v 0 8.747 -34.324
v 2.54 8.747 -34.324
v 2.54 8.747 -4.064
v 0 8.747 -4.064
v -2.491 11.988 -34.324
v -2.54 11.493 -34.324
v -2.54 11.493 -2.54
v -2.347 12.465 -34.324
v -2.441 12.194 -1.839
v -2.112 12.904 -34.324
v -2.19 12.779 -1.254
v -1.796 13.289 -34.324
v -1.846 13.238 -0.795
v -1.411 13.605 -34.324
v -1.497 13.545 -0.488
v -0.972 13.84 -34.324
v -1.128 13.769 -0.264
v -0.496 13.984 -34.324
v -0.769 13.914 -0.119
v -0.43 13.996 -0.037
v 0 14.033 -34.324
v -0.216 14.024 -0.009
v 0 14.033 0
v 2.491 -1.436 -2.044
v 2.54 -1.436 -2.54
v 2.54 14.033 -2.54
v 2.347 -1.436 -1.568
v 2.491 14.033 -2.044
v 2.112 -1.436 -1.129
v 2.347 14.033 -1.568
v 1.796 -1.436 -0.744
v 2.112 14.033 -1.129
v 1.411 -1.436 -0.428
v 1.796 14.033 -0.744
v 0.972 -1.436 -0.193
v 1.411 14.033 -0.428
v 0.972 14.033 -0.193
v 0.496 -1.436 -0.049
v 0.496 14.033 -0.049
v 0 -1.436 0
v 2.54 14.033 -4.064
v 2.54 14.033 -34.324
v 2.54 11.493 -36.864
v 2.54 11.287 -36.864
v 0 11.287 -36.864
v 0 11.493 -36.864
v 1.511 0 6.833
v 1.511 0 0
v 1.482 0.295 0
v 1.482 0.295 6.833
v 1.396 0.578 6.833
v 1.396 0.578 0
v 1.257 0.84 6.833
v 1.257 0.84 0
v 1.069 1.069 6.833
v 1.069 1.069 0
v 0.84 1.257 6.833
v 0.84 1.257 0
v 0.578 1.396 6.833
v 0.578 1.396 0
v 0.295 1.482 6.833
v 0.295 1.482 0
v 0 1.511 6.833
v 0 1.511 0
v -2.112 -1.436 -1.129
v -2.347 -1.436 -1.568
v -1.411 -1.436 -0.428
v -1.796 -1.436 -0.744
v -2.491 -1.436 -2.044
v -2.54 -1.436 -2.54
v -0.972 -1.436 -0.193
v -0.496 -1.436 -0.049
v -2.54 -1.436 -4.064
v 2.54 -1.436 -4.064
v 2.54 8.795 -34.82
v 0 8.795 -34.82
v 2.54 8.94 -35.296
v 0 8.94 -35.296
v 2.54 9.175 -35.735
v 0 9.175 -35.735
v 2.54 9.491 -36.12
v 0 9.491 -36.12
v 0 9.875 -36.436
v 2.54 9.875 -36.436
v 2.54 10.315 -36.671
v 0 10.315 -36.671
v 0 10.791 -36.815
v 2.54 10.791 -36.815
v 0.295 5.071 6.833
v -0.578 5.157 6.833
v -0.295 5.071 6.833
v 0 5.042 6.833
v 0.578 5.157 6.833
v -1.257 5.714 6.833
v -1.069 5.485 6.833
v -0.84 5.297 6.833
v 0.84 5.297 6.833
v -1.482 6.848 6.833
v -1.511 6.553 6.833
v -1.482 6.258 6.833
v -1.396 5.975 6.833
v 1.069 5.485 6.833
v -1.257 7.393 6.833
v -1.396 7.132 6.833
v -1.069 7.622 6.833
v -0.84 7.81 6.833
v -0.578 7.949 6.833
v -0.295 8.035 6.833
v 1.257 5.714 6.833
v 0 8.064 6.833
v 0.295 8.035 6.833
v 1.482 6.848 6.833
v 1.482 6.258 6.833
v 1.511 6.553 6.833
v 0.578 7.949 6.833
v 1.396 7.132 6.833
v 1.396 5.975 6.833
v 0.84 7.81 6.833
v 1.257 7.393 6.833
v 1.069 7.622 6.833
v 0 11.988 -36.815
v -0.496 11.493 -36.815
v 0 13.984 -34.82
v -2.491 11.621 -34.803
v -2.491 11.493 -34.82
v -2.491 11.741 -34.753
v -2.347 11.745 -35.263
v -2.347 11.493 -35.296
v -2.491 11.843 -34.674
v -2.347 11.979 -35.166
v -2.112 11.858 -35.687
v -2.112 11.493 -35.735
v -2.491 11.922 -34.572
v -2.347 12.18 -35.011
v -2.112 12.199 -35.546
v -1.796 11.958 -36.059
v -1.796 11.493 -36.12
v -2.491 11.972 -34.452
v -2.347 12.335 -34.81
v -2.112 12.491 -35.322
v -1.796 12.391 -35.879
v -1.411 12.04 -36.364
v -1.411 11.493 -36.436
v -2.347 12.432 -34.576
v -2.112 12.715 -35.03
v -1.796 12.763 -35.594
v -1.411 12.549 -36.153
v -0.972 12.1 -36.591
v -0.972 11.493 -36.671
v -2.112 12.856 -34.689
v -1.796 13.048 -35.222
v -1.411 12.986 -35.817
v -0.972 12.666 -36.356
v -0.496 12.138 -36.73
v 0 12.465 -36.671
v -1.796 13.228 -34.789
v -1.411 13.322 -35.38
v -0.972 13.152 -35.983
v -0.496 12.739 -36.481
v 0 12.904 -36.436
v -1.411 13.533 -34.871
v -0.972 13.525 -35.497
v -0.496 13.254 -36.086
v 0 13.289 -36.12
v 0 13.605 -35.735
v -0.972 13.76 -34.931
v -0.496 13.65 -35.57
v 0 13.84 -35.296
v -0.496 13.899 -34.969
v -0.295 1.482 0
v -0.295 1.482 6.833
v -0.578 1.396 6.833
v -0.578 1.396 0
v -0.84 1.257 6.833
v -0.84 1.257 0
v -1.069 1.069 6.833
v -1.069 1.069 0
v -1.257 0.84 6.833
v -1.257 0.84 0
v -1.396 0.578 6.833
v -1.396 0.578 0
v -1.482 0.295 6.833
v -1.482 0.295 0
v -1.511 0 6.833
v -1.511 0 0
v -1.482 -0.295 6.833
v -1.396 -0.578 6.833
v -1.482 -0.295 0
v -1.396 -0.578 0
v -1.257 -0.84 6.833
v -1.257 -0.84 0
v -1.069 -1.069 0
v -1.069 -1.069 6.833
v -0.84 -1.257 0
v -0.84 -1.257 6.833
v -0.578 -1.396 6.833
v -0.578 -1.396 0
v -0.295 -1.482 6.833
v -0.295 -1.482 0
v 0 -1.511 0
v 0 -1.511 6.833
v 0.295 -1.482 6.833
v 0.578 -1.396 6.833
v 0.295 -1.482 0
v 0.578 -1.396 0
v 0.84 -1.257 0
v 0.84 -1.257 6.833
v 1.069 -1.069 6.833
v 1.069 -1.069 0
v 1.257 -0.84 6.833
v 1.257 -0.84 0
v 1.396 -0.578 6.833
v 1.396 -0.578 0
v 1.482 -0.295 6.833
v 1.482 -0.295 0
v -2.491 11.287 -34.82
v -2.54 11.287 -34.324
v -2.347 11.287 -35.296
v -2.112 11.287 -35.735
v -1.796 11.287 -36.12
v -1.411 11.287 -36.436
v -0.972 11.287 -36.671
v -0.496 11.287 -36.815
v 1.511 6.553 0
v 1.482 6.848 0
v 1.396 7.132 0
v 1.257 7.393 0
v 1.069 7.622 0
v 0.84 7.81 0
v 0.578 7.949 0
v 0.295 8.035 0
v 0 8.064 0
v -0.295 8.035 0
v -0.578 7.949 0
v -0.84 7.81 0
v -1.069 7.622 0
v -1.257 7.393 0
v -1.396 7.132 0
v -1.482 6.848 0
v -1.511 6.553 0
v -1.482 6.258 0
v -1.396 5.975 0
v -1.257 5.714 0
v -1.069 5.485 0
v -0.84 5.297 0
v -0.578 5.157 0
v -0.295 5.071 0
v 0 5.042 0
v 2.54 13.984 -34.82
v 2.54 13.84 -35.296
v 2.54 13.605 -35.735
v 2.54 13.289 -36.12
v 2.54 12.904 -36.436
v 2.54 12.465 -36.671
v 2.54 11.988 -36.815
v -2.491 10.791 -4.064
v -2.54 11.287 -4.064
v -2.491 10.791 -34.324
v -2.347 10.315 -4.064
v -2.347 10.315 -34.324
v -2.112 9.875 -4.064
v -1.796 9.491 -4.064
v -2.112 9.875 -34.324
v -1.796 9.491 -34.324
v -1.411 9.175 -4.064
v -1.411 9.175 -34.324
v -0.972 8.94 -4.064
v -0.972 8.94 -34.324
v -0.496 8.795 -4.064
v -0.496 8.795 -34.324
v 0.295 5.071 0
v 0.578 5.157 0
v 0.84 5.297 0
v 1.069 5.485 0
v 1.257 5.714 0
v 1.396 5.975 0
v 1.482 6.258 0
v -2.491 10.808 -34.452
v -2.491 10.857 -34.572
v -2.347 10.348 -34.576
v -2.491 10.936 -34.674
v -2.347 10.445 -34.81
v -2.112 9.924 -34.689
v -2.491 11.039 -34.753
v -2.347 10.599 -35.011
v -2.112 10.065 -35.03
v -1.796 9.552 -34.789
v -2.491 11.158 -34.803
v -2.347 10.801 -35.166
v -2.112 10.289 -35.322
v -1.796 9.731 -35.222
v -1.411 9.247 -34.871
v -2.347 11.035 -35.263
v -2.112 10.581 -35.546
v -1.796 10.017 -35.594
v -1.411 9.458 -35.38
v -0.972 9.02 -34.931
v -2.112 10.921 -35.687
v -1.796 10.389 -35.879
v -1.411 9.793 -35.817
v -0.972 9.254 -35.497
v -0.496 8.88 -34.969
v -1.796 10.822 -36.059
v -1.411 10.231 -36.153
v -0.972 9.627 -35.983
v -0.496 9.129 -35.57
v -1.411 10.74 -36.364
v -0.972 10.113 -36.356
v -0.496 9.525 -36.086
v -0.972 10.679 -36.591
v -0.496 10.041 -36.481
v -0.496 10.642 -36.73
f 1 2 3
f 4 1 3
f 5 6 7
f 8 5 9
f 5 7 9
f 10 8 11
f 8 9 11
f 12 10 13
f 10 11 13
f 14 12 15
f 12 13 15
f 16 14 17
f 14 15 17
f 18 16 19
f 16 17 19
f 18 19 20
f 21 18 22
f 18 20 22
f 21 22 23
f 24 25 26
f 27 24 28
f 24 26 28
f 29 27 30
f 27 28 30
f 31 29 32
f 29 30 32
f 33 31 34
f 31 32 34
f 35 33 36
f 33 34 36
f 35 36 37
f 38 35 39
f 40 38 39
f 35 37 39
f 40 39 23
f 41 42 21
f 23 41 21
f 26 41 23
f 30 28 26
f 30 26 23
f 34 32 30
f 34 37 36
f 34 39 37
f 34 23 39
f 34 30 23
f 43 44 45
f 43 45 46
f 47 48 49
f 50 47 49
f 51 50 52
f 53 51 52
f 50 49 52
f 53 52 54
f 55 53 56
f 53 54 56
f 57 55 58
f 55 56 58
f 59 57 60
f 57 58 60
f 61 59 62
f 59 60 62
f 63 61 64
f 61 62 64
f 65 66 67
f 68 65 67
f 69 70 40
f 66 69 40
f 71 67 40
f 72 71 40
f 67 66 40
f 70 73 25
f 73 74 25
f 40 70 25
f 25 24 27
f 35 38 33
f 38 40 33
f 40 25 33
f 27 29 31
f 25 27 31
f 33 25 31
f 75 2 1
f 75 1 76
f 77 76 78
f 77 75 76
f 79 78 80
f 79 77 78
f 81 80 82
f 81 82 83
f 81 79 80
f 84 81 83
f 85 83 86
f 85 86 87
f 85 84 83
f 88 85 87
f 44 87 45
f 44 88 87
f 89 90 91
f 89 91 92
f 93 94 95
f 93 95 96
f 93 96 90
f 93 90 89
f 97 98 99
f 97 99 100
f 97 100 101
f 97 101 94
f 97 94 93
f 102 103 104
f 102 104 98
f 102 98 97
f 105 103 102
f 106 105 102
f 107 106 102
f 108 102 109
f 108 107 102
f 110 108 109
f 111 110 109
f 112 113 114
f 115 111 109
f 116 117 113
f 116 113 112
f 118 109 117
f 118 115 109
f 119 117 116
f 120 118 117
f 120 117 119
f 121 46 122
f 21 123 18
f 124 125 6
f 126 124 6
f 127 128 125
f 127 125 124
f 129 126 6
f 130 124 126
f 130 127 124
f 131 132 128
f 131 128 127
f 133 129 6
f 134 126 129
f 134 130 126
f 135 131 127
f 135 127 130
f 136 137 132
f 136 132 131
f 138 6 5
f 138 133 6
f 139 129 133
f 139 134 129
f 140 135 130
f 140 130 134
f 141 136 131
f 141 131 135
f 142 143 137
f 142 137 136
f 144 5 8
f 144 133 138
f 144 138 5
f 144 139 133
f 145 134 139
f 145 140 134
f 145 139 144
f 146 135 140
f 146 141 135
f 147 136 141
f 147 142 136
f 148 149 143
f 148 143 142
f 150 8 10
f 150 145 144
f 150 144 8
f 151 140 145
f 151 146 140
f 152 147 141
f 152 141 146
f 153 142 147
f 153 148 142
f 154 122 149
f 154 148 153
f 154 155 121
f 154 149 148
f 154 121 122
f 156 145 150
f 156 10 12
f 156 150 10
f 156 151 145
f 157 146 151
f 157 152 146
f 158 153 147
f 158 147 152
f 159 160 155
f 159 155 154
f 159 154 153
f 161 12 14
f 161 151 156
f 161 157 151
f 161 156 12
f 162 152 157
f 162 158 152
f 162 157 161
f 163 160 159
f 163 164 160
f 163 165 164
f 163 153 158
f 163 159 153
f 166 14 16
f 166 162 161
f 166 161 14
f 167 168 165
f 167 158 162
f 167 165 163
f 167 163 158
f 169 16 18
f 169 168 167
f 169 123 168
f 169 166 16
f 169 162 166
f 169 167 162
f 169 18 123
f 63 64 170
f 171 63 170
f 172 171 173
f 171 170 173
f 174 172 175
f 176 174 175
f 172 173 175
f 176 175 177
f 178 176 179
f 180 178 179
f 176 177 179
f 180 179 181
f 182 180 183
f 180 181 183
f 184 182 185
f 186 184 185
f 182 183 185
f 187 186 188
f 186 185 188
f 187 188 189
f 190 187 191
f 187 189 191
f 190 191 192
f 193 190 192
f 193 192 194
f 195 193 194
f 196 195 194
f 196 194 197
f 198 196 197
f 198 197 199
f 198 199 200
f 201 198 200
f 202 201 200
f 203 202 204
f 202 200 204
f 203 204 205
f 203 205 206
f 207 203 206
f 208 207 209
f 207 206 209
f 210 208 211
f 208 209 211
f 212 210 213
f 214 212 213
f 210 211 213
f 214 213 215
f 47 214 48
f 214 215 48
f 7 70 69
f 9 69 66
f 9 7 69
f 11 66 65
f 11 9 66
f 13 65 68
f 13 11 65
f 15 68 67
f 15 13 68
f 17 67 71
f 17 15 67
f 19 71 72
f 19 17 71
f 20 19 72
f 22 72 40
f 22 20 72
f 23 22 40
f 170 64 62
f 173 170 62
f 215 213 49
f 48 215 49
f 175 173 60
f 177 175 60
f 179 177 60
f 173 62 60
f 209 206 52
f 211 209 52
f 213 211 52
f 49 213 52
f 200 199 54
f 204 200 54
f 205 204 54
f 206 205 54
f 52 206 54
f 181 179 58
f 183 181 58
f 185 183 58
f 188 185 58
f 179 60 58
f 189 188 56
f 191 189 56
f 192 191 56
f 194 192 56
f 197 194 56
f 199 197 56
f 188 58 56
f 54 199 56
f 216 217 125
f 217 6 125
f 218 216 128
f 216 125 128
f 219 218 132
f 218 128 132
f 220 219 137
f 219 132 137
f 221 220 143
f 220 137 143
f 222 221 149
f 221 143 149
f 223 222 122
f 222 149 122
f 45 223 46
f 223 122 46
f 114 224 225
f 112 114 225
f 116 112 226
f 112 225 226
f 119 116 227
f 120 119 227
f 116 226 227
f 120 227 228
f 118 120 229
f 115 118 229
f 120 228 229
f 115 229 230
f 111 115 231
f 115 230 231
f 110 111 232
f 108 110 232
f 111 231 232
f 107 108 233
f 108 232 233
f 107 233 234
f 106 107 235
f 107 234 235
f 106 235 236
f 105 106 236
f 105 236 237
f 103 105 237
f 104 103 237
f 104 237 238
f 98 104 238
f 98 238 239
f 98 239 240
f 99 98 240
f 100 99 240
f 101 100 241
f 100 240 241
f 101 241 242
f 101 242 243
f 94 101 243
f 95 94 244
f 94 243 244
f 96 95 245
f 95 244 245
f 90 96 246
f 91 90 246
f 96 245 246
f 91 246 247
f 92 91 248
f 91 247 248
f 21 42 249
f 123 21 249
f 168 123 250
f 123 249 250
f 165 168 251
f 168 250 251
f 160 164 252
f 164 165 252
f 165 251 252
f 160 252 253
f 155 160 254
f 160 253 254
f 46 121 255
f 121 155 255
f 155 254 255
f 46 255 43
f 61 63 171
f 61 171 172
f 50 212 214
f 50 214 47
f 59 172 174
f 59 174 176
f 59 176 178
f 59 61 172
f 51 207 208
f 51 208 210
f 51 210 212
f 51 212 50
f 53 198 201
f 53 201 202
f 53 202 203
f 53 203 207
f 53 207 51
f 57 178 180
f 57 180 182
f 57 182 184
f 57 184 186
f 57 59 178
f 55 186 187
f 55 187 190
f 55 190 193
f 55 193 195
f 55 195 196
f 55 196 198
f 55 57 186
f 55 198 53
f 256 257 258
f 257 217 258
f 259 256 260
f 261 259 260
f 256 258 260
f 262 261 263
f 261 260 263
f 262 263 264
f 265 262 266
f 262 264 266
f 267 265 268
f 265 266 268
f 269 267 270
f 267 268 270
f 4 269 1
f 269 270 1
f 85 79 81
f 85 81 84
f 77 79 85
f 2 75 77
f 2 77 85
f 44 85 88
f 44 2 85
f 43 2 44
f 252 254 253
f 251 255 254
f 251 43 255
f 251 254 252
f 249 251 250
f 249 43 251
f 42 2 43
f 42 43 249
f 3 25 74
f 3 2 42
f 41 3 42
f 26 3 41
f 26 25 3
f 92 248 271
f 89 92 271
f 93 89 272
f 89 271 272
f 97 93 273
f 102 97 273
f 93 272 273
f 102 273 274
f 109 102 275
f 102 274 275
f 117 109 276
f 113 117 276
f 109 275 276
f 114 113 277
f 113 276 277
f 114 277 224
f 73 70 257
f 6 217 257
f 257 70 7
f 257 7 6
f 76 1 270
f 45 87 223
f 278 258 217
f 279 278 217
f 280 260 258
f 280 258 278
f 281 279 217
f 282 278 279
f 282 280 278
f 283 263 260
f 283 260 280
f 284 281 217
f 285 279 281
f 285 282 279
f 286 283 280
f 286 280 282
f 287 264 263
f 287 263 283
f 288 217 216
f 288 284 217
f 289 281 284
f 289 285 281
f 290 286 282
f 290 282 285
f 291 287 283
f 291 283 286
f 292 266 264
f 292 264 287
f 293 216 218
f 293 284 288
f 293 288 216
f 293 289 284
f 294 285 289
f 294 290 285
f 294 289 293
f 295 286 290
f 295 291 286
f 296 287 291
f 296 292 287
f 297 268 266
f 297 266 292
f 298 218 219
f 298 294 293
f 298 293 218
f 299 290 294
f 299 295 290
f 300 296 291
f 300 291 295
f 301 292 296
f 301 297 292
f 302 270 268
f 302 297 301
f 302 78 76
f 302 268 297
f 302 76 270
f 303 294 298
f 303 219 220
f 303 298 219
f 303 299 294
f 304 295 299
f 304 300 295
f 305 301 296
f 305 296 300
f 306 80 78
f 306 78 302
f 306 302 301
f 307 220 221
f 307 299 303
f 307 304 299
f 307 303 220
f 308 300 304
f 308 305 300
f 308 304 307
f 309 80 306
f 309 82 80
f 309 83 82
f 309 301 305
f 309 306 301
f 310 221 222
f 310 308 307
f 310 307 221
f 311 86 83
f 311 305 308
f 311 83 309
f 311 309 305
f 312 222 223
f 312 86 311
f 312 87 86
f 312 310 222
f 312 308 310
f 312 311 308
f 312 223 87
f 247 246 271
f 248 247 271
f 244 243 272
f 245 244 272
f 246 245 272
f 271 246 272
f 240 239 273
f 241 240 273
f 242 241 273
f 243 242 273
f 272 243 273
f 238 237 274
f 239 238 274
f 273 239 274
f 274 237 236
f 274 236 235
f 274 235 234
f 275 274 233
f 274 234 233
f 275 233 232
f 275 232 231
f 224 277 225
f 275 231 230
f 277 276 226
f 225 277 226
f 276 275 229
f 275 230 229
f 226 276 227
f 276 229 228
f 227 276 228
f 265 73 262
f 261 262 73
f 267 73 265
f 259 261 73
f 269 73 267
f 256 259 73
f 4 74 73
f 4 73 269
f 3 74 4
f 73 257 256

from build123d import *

# Parameters (mm, degrees)
F1_DEPTH      = 6.8326
F2_W          = 15.4686
F2_H          = 4.064
F3_DEPTH      = 2.54
F3_DEPTH_BACK = 2.54
F4_W          = 5.2863146343
F4_H          = 32.8
F5_DEPTH      = 2.54
F5_DEPTH_BACK = 2.54
F6_R          = 2.54
F7_R          = 2.53999


# Not quite as in the source:
# - a fillet or chamfer is up to 0.001 mm smaller than in the source, because OpenCascade refuses the exact size


with BuildPart() as f1:
    # F0 (on Top) → F1 (new body)
    with BuildSketch(Plane.XY):
        with BuildLine():
            ThreePointArc((0, 5.0419), (1.0686504784, 5.4845495216), (1.5113, 6.5532))
            ThreePointArc((1.5113, 6.5532), (-1.0686504784, 7.6218504784), (0, 5.0419))
        make_face()
    extrude(amount=F1_DEPTH)


with BuildPart() as f1b:
    # F0 (on Top) → F1, piece 2 (new body)
    with BuildSketch(Plane.XY):
        with BuildLine():
            ThreePointArc((1.5113, 0), (1.0686504784, 1.0686504784), (0, 1.5113))
            ThreePointArc((0, 1.5113), (-1.0686504784, -1.0686504784), (1.5113, 0))
        make_face()
    extrude(amount=F1_DEPTH)


with BuildPart() as f3:
    # F2 (on Right) → F3 (new body, two sides)
    with BuildSketch(Plane.YZ) as f3_sk:
        with Locations((6.2986569509, -2.032)):
            Rectangle(F2_W, F2_H)
    extrude(amount=F3_DEPTH)
    extrude(f3_sk.sketch, amount=-F3_DEPTH_BACK)

    # F4 (on Right) → F5 (join, two sides)
    with BuildSketch(Plane.YZ) as f5_sk:
        with Locations((11.3897996337, -20.464)):
            Rectangle(F4_W, F4_H)
    extrude(amount=F5_DEPTH)
    extrude(f5_sk.sketch, amount=-F5_DEPTH_BACK)

    # F6
    f6_edges = [f3.edges().sort_by_distance(p)[0] for p in [
        (0, 8.746642, -36.864),
        (0, 14.032957, -36.864),
    ]]
    fillet(f6_edges, radius=F6_R)

    # F7 (radius 2.54 in the source; OpenCascade refuses exactly that, so slightly less here)
    f7_edges = [f3.edges().sort_by_distance(p)[0] for p in [
        (2.54, 6.298657, 0),
        (-2.54, 6.298657, 0),
        (-2.54, 14.032957, -17.162),
    ]]
    fillet(f7_edges, radius=F7_R)


solid = Compound([f1.part, f1b.part, f3.part])
